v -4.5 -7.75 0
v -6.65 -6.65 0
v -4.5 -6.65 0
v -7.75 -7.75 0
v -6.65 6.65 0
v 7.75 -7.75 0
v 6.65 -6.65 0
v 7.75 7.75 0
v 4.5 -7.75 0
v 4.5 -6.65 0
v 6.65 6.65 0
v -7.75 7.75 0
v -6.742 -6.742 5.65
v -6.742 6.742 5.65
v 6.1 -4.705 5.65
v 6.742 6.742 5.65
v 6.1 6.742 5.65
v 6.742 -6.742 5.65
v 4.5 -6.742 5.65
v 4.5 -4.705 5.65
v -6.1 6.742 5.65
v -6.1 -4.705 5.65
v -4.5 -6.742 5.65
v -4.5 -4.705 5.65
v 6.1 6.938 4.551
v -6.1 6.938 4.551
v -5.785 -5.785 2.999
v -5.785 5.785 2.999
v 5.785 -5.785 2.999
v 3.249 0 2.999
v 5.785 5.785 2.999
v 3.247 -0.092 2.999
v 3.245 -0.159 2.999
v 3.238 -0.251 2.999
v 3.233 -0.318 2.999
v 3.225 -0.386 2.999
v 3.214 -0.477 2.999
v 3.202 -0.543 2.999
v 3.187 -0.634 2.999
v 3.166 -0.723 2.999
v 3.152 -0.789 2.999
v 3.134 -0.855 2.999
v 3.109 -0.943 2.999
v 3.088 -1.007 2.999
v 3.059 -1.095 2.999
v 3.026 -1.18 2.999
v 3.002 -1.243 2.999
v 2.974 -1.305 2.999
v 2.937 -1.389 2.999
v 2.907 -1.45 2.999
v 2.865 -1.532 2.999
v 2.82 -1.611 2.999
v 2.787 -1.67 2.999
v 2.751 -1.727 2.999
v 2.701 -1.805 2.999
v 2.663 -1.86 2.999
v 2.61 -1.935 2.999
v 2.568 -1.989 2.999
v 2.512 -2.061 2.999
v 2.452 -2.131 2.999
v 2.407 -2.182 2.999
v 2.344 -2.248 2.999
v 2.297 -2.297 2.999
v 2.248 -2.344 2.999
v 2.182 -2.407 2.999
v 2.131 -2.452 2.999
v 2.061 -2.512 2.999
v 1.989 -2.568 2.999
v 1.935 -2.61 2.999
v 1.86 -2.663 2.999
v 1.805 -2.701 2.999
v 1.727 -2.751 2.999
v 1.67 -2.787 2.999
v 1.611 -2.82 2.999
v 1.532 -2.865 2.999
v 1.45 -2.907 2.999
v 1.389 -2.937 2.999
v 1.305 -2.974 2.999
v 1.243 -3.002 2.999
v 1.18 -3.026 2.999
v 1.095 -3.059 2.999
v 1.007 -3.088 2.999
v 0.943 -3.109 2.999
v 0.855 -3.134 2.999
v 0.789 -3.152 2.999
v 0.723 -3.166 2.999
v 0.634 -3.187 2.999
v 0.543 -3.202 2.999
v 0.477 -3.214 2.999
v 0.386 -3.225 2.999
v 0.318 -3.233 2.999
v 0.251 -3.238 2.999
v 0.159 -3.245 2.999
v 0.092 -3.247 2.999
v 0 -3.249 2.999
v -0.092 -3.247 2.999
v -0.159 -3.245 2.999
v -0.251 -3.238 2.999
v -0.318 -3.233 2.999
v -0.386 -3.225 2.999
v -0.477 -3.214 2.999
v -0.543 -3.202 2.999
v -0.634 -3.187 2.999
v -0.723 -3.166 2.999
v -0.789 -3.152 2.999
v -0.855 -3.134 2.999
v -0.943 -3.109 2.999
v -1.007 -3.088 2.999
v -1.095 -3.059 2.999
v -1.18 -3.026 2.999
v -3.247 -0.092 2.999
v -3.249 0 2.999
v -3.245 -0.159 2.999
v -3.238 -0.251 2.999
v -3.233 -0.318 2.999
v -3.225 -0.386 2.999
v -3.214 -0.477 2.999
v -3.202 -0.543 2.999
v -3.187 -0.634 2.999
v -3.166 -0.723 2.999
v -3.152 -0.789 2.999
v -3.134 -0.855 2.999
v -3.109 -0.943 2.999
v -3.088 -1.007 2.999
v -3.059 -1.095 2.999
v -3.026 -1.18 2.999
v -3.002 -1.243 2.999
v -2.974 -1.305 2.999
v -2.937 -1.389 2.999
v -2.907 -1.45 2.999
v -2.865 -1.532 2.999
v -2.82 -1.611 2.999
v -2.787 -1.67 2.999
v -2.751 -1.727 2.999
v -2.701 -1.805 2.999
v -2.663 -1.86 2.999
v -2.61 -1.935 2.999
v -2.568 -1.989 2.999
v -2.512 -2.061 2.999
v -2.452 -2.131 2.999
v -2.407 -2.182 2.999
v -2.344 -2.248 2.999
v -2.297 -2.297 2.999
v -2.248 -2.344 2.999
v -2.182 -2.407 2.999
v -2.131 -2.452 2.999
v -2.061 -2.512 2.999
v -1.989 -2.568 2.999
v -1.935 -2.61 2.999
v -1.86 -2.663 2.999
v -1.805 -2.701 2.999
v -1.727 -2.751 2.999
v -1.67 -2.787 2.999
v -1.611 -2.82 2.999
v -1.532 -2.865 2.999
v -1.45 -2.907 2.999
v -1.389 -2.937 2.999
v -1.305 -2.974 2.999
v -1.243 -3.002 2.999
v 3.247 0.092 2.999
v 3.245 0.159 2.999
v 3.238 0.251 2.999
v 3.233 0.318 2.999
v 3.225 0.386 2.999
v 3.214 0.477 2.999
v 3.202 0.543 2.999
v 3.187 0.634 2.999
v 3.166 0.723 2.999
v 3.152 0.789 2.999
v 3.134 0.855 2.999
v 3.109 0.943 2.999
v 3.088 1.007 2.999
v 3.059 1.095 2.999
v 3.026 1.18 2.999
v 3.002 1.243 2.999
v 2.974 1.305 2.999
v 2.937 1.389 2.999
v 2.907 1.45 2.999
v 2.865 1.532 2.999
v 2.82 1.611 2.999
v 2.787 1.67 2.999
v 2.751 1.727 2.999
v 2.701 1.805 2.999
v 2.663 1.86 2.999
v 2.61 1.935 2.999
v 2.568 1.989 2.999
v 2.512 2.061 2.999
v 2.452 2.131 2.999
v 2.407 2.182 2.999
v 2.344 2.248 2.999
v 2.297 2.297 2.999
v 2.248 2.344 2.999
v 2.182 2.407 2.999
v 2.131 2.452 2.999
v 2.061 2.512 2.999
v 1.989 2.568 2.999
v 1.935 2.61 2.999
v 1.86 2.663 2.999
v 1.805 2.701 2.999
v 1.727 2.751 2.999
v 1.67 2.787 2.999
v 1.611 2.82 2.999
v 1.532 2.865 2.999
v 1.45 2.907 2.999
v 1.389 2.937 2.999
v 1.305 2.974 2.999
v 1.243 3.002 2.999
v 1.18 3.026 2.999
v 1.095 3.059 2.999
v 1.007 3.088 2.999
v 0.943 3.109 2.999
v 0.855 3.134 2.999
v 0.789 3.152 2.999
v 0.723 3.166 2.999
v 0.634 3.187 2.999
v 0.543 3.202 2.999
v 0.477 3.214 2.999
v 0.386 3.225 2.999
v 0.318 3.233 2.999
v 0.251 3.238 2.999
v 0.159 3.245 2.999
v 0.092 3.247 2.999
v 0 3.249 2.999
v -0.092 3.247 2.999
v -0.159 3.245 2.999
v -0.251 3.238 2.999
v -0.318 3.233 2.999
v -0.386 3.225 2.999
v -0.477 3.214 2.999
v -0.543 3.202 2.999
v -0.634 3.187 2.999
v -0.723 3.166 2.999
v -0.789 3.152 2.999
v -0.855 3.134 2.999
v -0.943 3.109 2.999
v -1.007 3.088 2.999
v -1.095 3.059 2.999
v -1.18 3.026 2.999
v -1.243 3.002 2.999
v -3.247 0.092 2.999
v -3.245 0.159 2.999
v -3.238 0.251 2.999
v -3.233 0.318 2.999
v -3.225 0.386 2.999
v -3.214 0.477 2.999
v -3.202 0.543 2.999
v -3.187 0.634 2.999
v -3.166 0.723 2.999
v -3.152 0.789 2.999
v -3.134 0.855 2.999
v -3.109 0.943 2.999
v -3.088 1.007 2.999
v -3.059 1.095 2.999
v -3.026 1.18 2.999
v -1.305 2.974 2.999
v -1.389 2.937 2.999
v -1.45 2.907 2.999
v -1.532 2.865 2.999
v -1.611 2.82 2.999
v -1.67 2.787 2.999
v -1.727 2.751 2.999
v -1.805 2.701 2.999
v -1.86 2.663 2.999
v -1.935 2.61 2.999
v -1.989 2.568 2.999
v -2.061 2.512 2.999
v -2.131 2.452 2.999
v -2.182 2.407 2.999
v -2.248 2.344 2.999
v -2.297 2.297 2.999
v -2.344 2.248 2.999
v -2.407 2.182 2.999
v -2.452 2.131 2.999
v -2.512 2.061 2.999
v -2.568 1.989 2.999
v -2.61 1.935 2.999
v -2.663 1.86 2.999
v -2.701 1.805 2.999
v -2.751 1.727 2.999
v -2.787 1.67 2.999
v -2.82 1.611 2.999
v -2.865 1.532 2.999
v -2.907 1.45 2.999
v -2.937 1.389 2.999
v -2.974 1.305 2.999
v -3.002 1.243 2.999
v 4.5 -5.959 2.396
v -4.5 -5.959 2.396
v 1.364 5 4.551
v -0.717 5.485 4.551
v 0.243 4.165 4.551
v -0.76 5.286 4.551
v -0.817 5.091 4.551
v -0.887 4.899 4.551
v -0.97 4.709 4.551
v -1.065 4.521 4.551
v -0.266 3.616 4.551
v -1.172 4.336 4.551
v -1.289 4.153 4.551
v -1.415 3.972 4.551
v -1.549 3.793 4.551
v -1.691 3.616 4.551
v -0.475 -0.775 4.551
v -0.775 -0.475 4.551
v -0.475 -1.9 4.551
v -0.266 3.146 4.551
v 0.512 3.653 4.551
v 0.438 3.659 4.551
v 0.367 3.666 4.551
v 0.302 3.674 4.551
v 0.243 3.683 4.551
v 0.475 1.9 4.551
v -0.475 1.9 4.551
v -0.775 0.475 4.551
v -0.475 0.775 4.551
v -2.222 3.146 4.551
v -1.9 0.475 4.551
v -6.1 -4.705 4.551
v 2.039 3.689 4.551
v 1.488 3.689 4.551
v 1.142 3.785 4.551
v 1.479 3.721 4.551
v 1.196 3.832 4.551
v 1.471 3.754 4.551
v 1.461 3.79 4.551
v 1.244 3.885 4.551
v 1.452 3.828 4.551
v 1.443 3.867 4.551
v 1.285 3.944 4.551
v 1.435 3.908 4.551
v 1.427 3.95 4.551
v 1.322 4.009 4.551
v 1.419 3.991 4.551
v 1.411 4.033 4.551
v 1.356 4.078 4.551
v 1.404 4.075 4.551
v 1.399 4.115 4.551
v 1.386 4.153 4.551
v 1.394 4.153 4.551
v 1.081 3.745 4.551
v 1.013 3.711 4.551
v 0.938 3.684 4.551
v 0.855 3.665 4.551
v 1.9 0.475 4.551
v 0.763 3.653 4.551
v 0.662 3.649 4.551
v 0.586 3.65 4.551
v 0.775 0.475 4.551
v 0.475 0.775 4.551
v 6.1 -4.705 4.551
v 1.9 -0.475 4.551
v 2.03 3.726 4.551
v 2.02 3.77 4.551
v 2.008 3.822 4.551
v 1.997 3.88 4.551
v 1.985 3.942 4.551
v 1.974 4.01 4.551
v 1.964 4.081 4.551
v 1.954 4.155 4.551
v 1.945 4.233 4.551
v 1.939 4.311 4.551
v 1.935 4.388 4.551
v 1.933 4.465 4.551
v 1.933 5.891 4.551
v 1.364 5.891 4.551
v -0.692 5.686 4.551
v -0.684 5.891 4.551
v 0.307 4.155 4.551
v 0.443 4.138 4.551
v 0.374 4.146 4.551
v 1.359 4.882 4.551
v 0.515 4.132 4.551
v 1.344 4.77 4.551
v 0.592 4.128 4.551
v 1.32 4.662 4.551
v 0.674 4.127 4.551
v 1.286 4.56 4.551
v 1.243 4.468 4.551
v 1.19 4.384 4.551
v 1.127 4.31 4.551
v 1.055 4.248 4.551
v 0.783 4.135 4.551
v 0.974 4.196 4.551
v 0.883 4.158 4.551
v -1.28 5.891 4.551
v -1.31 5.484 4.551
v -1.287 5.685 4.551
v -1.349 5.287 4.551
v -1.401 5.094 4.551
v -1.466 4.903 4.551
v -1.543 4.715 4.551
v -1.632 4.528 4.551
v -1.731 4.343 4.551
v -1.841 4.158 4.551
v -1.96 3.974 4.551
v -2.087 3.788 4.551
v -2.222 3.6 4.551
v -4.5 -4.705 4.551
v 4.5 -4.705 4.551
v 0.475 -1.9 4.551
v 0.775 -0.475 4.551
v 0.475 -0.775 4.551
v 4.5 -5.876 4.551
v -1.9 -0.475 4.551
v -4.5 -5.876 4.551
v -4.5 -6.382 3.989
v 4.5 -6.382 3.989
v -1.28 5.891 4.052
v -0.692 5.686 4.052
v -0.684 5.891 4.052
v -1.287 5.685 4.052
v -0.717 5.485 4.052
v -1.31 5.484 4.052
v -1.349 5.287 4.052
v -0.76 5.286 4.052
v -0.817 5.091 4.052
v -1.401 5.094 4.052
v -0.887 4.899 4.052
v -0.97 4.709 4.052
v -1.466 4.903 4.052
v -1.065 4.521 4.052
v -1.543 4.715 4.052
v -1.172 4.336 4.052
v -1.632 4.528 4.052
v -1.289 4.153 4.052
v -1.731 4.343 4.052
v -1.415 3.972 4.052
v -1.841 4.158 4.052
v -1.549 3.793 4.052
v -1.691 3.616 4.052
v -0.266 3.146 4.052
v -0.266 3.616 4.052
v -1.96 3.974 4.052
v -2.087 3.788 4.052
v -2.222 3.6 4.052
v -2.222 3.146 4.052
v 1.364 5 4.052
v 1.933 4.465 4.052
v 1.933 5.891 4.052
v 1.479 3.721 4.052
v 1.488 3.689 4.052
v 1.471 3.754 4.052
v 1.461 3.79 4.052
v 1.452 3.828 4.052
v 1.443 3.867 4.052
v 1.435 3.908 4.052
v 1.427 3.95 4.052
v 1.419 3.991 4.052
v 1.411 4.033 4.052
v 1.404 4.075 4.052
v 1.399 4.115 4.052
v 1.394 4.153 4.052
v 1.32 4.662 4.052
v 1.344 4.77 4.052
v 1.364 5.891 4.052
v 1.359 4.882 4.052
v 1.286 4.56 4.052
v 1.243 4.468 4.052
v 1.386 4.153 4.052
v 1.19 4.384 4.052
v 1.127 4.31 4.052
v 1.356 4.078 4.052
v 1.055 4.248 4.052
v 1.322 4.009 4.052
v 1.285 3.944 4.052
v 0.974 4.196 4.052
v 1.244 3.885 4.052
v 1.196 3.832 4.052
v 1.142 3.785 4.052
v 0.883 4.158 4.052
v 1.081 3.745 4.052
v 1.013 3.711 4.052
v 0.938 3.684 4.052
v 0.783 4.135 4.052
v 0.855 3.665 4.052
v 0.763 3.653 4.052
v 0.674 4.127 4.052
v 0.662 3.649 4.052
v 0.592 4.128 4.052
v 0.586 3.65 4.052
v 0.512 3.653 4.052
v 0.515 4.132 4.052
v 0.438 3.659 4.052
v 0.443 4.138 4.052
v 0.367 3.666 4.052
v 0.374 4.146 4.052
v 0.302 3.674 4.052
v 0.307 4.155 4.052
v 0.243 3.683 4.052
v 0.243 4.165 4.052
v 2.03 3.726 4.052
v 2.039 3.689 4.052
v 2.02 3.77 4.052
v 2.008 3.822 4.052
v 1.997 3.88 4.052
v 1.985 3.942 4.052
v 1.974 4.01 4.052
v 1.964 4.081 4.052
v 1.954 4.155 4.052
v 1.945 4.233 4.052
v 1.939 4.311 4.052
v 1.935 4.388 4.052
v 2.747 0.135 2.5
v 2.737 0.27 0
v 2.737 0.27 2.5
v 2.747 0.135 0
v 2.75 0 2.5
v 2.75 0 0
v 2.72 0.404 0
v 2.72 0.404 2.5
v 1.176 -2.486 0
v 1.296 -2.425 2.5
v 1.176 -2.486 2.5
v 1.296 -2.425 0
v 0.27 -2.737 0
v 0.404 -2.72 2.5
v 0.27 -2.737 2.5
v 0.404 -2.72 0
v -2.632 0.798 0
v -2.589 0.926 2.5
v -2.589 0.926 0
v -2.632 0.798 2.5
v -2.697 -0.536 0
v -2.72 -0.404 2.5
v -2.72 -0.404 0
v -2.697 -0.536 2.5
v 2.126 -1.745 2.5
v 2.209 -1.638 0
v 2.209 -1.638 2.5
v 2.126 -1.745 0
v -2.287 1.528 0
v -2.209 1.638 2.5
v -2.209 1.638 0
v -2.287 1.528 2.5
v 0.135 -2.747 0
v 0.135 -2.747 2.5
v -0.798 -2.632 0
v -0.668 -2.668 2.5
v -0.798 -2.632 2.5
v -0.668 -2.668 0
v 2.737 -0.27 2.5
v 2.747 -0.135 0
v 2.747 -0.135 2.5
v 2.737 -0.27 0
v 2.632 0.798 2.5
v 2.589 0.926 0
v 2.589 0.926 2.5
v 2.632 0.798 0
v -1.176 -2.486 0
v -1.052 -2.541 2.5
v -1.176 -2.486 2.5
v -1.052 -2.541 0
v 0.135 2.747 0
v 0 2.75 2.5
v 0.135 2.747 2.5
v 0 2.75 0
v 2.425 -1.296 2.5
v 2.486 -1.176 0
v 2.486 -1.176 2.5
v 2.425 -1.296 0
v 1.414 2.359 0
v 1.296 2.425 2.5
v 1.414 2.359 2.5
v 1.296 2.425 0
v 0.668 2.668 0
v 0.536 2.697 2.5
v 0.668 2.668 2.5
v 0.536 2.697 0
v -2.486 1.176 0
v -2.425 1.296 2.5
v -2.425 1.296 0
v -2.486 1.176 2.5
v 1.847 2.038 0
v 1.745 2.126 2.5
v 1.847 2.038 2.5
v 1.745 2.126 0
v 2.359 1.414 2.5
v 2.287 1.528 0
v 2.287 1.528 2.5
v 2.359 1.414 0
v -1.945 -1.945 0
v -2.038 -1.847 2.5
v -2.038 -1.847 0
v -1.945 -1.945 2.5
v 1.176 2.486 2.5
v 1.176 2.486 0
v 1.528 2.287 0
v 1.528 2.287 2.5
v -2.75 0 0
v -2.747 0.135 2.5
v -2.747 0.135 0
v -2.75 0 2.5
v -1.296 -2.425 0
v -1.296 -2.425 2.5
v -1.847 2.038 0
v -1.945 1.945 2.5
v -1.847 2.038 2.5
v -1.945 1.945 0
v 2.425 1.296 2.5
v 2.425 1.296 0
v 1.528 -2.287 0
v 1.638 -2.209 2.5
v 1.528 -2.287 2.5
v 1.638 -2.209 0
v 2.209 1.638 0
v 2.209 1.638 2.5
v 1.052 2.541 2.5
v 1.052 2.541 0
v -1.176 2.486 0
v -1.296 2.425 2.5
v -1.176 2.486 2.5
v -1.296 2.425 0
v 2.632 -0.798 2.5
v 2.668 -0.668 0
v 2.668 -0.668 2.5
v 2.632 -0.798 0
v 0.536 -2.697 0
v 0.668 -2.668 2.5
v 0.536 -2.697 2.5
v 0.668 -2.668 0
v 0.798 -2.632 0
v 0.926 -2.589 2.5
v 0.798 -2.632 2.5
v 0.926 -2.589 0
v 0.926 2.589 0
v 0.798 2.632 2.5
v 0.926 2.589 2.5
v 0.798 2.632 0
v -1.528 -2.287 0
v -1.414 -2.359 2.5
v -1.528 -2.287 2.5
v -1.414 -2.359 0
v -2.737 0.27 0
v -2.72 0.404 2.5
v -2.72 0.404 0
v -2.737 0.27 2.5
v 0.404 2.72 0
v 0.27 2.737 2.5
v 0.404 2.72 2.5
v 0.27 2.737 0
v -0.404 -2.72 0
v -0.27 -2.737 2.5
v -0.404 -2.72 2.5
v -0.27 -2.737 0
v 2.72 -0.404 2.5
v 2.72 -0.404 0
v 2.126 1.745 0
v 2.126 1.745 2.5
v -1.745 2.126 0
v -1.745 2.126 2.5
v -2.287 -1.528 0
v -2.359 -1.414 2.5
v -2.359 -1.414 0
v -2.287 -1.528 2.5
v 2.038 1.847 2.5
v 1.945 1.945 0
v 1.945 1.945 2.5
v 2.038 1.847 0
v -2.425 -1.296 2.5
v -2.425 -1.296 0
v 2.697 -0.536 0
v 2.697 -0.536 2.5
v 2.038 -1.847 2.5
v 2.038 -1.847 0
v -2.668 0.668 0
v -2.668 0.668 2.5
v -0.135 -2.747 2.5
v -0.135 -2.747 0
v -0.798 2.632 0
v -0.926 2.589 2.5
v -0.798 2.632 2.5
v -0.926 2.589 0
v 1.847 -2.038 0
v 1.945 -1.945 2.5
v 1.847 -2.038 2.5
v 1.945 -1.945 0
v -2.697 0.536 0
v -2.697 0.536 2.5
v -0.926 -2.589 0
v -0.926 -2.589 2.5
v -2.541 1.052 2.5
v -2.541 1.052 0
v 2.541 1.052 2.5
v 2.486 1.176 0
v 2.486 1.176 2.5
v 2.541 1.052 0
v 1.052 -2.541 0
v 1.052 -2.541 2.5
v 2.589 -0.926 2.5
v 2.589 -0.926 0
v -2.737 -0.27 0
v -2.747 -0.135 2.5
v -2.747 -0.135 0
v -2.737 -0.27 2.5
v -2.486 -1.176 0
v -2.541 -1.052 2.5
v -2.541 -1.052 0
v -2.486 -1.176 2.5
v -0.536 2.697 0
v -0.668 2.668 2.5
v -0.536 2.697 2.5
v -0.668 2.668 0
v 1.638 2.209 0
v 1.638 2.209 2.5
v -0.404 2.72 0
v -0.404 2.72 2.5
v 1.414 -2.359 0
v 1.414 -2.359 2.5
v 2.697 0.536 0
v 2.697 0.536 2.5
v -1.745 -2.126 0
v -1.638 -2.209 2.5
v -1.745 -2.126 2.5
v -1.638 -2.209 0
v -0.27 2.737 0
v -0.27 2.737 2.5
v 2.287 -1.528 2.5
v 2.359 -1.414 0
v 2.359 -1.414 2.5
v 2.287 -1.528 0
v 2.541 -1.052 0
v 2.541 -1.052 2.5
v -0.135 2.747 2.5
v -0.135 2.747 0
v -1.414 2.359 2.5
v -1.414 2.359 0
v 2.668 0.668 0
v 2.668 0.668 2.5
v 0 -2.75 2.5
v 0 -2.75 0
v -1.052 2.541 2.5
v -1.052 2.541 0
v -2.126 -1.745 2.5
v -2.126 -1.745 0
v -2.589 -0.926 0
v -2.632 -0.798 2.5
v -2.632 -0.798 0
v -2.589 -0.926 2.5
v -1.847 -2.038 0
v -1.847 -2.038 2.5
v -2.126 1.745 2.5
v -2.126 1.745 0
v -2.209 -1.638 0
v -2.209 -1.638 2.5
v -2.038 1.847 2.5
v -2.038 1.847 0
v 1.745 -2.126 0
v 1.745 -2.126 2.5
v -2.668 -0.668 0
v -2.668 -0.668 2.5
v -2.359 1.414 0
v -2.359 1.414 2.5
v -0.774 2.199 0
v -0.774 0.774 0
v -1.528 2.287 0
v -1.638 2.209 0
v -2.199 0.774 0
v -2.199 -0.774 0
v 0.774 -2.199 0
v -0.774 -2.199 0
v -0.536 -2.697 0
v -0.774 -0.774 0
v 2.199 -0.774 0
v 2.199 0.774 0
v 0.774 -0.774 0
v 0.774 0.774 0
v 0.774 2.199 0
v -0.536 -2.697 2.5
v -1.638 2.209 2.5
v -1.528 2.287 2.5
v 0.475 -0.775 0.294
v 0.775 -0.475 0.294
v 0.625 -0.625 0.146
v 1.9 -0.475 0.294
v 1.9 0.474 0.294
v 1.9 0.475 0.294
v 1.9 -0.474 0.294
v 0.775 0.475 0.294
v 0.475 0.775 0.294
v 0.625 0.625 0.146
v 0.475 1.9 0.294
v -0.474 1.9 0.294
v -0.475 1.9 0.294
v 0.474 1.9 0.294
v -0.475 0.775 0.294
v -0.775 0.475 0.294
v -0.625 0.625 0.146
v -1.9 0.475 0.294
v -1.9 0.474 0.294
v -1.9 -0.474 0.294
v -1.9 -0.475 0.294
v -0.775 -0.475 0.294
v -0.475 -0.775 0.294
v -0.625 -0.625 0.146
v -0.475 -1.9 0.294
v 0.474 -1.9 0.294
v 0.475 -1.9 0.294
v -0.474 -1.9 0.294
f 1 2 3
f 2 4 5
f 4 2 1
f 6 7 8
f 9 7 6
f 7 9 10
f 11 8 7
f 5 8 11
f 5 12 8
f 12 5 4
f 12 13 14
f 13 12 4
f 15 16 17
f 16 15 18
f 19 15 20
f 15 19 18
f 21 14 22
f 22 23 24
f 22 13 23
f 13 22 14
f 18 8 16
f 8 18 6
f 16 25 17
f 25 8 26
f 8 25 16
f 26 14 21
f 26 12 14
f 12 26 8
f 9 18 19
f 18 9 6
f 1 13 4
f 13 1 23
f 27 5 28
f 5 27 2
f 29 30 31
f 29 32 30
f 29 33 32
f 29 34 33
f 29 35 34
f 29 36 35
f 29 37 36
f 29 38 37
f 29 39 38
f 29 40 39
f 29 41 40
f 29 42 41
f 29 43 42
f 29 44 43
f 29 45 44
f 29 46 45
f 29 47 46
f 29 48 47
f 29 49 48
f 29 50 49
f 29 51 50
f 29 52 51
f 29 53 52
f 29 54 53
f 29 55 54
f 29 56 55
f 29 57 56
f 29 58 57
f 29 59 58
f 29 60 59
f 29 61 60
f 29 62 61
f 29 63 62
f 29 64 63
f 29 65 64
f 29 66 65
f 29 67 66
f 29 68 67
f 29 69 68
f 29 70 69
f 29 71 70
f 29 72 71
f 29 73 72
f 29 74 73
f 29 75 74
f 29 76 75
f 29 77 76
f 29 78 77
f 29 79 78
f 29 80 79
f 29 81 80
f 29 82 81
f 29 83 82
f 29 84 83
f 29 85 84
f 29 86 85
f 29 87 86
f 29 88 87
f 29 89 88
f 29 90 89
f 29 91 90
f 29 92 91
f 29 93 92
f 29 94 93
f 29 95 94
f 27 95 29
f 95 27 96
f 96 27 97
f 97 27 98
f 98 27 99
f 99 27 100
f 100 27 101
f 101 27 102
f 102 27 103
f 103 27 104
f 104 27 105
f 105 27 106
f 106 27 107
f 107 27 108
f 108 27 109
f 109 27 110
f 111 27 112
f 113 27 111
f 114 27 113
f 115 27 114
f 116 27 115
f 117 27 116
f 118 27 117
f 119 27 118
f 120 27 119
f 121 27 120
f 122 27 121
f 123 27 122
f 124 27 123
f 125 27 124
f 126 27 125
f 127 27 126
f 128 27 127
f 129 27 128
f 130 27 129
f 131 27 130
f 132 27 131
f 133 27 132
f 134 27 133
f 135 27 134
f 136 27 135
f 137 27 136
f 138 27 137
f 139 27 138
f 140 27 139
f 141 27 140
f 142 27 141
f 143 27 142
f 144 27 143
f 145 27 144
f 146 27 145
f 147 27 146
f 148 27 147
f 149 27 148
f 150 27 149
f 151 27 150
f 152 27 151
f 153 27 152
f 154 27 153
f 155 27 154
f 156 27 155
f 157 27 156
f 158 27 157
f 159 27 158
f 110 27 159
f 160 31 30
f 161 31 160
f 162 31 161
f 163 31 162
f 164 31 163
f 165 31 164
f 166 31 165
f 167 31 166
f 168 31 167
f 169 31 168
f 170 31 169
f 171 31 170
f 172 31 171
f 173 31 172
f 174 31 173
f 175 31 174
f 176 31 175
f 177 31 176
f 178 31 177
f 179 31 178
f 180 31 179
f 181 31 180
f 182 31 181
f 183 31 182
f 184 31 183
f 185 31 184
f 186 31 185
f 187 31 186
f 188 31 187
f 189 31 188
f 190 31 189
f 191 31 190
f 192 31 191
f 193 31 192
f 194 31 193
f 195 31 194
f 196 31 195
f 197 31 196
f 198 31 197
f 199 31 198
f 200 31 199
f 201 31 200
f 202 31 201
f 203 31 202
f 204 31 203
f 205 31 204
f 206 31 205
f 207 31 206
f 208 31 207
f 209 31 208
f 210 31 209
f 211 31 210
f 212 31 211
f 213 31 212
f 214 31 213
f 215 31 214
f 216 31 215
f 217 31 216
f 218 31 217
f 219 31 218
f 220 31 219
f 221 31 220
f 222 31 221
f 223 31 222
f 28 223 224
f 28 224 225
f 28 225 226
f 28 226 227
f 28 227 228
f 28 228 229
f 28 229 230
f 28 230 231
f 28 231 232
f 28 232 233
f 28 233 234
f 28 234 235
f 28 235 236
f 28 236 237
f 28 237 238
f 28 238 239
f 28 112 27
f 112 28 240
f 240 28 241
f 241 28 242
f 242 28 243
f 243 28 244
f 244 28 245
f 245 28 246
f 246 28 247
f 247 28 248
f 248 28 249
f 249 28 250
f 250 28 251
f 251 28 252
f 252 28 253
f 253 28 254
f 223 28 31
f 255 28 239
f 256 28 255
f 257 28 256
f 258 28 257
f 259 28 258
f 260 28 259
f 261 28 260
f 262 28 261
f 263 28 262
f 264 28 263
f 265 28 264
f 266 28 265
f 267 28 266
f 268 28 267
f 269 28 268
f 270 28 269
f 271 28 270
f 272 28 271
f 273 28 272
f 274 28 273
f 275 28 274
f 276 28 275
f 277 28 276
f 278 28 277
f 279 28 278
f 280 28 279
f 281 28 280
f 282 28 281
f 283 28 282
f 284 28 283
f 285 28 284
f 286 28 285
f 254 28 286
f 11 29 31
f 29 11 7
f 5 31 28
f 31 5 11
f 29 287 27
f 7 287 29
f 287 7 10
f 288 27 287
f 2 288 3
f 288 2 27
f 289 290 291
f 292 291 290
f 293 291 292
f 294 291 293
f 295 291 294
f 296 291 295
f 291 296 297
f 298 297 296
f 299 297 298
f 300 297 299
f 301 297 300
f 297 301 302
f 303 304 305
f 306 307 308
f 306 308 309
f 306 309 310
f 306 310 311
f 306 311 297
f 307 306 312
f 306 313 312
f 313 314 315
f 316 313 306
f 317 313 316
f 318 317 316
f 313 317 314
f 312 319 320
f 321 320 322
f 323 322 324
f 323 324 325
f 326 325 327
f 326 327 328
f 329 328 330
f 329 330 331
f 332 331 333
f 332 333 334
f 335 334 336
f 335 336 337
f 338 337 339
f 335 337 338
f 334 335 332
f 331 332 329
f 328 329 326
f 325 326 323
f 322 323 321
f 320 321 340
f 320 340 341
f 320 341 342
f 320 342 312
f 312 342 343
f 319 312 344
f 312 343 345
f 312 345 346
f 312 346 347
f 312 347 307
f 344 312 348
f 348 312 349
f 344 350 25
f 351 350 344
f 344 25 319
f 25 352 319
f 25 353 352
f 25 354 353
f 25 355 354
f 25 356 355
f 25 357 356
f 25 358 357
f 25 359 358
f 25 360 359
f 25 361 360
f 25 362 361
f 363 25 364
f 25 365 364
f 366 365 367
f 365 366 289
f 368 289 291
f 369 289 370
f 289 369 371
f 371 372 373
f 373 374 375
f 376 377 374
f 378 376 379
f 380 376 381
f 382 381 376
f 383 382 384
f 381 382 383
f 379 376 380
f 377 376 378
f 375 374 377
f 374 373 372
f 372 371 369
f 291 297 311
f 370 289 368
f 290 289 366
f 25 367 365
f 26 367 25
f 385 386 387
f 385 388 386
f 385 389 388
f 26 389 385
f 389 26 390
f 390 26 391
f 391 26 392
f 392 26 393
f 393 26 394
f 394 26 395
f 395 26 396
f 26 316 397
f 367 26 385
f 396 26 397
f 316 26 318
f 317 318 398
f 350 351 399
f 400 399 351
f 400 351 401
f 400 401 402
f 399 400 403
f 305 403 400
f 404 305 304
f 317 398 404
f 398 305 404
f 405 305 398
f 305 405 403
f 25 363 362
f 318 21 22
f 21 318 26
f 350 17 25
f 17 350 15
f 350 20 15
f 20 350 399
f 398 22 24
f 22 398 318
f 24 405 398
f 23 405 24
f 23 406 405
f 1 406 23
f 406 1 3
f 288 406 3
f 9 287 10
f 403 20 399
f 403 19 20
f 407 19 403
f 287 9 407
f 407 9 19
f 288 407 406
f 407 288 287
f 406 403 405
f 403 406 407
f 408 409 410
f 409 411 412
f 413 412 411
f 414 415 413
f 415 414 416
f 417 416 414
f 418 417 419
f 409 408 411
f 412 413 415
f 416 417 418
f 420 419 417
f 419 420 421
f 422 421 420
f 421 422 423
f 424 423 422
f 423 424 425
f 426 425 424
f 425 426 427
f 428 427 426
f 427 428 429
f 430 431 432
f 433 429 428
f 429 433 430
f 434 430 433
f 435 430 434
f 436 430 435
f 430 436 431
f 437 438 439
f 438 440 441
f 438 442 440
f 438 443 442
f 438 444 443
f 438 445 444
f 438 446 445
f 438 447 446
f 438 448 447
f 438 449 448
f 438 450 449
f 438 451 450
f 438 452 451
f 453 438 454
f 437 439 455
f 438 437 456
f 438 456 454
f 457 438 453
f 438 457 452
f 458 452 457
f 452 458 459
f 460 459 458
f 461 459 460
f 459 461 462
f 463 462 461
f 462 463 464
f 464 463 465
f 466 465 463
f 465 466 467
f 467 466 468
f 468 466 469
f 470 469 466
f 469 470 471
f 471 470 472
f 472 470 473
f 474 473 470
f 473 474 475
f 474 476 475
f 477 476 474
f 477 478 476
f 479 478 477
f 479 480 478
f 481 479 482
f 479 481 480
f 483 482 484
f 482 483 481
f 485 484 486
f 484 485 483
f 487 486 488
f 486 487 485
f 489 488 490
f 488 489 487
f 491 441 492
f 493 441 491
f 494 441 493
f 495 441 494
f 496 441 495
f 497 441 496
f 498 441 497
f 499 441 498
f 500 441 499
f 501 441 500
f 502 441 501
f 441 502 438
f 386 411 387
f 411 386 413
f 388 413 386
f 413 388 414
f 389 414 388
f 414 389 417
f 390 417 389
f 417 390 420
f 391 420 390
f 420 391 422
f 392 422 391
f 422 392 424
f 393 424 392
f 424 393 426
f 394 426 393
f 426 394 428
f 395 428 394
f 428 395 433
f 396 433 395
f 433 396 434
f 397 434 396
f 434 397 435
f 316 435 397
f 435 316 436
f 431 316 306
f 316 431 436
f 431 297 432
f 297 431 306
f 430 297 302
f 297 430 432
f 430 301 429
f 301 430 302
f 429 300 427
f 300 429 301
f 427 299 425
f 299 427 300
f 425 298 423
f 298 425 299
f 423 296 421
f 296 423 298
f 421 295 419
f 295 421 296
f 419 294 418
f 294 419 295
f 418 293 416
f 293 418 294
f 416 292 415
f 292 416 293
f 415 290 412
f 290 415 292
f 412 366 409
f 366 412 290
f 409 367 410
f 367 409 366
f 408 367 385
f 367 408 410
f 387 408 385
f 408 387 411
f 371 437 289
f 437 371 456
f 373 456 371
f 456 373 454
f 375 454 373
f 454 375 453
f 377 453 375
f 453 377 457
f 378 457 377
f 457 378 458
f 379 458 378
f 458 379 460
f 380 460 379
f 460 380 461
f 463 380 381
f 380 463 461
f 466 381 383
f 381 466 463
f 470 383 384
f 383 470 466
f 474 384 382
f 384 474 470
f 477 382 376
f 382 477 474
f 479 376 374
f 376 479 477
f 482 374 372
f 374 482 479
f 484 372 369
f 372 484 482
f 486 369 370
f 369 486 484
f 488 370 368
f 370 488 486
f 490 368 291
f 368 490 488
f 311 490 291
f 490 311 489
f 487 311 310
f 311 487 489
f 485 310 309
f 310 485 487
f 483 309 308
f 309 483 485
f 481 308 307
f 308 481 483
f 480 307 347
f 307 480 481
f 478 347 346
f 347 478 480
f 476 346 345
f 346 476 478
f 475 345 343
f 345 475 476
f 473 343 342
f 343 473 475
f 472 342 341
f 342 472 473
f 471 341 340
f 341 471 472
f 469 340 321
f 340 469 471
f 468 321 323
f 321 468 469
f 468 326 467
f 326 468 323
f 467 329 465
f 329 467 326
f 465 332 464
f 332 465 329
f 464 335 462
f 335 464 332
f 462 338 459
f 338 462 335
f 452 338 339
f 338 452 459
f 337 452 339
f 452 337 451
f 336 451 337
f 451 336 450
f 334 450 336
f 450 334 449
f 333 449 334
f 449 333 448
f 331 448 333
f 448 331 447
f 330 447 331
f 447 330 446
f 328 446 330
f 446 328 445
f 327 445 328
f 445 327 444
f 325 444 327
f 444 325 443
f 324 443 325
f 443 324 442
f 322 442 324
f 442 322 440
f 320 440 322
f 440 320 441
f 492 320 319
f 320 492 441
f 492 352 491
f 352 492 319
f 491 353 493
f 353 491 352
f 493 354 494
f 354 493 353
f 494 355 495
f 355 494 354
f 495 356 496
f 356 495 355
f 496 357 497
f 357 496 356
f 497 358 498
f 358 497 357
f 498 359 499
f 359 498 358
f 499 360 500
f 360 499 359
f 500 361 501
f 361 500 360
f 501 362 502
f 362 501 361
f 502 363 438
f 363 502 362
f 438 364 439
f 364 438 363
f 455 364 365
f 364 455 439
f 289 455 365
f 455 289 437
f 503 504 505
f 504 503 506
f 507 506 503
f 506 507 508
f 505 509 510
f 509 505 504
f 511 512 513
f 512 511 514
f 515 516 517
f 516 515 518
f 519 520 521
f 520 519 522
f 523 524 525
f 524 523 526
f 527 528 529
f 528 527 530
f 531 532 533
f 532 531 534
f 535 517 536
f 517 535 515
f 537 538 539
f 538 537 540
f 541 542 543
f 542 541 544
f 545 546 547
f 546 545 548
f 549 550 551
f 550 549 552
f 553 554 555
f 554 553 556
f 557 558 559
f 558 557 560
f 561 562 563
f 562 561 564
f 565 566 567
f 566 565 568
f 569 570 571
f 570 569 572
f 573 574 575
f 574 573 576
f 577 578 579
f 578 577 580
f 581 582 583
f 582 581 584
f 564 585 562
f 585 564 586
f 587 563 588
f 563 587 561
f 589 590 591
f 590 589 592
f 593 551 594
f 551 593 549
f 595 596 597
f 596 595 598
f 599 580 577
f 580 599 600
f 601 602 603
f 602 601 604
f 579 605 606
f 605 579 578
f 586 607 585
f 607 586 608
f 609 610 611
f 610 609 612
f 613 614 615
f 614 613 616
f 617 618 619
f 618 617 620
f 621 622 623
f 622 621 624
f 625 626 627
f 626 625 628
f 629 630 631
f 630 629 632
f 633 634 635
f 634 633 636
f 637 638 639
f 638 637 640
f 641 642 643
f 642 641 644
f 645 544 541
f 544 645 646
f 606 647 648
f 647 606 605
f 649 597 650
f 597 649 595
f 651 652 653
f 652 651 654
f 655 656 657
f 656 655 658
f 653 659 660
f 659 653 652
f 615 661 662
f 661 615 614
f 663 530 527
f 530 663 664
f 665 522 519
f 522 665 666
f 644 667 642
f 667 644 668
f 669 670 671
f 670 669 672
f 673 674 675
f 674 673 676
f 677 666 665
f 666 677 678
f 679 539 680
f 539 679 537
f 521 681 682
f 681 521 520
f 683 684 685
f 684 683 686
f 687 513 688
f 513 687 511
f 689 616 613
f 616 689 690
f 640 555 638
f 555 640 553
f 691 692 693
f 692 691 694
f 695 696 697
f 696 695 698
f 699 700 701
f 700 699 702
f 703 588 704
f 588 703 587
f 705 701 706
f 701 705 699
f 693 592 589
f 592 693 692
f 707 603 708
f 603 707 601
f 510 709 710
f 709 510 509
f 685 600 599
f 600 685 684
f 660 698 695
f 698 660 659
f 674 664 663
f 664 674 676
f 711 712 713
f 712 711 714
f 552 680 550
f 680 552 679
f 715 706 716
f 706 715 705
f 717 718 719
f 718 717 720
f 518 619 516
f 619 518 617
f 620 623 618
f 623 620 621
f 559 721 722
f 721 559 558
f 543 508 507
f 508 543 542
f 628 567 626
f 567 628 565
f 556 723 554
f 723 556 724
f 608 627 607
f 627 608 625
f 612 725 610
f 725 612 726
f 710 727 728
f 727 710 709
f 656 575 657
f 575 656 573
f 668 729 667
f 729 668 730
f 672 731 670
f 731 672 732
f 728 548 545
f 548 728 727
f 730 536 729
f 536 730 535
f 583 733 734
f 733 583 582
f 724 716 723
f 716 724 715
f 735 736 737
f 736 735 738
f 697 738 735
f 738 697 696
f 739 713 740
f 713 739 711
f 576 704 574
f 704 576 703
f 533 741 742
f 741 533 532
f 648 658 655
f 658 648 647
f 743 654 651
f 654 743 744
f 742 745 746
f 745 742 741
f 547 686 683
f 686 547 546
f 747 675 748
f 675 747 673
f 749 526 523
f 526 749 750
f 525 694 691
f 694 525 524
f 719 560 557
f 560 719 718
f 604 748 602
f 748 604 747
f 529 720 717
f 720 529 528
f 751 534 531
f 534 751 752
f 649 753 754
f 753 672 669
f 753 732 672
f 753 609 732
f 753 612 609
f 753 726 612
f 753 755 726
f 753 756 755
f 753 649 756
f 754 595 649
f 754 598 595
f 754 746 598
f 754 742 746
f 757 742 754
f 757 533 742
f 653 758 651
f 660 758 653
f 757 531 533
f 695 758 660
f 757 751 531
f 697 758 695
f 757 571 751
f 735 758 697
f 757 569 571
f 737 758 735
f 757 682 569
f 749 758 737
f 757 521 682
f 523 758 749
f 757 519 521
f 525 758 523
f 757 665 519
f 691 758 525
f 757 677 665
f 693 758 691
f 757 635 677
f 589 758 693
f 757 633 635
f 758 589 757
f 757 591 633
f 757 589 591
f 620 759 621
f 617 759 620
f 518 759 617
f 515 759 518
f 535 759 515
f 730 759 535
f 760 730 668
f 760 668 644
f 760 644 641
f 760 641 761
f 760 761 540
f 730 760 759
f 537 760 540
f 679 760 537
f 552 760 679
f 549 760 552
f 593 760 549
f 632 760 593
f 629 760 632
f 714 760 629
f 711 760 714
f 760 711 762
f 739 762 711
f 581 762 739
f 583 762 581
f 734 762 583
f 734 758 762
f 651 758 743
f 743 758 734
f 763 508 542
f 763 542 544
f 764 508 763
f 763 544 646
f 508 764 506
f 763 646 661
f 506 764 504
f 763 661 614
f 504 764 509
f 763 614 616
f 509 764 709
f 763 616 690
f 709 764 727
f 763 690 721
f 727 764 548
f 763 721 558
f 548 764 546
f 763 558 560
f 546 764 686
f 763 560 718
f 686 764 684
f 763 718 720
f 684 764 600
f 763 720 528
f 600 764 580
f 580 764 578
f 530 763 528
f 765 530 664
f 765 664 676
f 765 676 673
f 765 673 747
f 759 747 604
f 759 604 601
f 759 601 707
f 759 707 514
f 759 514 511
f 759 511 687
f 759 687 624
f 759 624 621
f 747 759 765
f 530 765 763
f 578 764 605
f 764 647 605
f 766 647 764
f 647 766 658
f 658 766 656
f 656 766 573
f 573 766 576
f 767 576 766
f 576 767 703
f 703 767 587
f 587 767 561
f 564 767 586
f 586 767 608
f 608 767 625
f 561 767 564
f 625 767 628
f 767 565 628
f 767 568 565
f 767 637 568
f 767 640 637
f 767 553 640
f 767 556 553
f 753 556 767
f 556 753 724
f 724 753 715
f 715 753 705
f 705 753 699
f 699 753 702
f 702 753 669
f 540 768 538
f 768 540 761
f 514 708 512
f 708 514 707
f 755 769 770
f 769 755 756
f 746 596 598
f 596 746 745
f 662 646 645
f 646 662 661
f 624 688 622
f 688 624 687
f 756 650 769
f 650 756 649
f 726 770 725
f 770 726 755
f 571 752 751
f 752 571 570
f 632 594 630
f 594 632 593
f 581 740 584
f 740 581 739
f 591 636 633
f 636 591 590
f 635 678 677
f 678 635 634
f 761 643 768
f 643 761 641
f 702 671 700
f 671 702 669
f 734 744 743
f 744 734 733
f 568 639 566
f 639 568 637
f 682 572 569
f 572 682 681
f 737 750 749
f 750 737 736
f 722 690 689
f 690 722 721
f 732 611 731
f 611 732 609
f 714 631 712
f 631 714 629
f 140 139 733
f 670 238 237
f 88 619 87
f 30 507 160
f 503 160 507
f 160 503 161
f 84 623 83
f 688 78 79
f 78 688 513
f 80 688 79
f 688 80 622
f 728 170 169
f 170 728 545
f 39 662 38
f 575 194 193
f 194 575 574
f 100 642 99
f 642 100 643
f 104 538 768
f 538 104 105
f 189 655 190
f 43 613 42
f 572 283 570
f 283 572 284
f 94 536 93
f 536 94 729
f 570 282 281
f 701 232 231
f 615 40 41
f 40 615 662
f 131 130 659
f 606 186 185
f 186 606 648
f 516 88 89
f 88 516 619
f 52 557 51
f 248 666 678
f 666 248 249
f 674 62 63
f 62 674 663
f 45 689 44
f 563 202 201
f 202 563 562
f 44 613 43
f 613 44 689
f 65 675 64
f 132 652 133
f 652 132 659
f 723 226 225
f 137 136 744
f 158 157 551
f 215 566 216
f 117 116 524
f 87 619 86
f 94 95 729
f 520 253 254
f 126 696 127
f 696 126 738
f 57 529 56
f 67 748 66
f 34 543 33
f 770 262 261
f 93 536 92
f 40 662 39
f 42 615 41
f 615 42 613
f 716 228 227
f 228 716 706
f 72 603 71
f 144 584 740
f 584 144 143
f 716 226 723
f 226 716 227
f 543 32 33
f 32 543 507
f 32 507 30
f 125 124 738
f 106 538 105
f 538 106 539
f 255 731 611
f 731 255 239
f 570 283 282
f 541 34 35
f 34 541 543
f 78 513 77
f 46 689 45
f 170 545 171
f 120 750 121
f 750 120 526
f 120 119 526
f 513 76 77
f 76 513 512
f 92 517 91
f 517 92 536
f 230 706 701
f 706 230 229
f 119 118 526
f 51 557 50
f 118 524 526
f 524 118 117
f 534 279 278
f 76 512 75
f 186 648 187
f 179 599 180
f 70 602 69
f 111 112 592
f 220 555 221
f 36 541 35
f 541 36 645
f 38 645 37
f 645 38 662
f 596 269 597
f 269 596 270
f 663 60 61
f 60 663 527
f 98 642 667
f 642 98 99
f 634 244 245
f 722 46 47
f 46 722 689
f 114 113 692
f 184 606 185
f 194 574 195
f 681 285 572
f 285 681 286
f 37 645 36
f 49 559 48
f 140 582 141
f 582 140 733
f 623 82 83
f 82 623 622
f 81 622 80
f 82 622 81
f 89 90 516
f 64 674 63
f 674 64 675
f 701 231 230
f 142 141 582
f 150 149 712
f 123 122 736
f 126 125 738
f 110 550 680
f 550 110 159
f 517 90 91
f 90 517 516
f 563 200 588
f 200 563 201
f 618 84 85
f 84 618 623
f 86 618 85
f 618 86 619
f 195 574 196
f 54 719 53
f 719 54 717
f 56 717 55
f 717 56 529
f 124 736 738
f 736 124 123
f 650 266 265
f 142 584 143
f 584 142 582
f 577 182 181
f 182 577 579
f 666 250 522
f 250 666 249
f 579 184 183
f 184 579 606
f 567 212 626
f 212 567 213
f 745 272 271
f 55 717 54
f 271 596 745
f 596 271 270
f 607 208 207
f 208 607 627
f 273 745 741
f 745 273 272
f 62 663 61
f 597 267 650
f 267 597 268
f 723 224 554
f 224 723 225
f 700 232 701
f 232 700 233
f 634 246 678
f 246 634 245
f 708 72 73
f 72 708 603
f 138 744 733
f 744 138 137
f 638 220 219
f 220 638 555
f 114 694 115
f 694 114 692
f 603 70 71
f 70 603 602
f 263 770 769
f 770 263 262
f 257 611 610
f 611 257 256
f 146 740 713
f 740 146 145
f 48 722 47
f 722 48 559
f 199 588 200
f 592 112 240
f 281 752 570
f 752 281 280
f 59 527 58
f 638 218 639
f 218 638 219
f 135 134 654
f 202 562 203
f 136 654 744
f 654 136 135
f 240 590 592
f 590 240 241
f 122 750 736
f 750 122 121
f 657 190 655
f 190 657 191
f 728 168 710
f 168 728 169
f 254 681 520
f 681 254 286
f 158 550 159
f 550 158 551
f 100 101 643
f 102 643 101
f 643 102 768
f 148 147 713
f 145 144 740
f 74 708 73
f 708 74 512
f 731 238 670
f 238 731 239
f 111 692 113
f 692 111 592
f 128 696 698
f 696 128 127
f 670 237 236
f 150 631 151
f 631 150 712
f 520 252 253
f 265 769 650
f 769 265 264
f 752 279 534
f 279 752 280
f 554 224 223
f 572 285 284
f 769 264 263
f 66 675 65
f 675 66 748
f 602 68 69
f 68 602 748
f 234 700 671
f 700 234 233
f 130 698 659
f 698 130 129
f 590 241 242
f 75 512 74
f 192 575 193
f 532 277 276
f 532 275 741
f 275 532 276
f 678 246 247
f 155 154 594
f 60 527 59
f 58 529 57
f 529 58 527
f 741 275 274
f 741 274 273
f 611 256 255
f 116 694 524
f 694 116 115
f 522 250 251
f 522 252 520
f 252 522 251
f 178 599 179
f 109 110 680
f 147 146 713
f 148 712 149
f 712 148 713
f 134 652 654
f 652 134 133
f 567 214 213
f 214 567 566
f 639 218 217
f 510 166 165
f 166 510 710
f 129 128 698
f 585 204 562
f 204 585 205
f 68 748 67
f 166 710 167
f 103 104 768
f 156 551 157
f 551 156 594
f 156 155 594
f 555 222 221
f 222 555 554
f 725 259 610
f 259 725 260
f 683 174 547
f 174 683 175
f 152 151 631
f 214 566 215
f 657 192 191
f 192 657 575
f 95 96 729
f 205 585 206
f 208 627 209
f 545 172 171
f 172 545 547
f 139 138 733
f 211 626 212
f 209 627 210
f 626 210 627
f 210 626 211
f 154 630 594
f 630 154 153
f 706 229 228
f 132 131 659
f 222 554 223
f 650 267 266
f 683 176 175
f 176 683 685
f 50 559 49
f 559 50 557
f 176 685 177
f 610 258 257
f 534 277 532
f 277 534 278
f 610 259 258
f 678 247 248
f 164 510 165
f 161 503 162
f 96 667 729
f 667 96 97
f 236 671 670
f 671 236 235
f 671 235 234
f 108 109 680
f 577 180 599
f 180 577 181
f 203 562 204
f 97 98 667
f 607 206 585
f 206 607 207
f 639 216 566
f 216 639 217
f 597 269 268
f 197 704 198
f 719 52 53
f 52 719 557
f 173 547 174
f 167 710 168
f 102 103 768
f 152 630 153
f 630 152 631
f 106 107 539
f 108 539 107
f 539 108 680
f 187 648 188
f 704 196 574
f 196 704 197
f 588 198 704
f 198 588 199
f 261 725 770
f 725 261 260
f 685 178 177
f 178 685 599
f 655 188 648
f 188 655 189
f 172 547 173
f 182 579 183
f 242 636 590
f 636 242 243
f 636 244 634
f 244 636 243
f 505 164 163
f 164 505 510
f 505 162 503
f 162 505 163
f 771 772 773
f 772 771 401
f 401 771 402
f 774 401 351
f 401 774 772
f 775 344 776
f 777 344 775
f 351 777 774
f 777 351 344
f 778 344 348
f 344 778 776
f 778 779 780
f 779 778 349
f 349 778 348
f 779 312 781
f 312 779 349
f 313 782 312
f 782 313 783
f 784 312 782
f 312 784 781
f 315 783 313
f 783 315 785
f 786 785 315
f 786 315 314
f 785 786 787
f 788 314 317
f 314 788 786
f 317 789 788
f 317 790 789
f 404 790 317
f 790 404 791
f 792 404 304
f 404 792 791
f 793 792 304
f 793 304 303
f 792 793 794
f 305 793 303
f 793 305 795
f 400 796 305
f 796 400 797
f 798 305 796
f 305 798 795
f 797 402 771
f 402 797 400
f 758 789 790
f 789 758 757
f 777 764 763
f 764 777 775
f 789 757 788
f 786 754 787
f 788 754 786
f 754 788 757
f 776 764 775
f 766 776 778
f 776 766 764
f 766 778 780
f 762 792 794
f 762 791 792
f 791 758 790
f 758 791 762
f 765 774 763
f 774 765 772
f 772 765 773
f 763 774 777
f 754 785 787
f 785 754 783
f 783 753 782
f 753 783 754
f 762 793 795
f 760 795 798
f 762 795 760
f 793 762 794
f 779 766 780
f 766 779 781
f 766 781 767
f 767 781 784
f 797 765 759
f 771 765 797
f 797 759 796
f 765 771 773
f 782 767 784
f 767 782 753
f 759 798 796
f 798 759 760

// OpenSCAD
revision = "r7";
text_font = "Liberation Mono:style=Bold";
text_size = 3;
text_height = 0.5;

surface_offset = 0.001;
stem_x = 15.5;
stem_y = 15.5;
stem_height = 5.65;
stem_top_bottom_ratio = 0.87;

inside_x = 13.3;
inside_y = 13.3;
inside_hight = 3;

mx_cylinder = 5.5;
mx_cross = 4.1;
mx_cross_width = 1.25;
mx_cross_fillet = 0.3;

disp_x = 12.2;
disp_y = 12.1;
disp_height = 1.1;
disp_y_center_offset = 1.345;
cable_stem_x = 9.0;
cable_stem_y = 2.12;
cable_thickness = 0.5;

difference() {
    union() {
        difference() {
            //hollow keycap
            linear_extrude(height = stem_height, scale = stem_top_bottom_ratio)
                square([stem_x, stem_y], center = true);
            translate([0,0,-surface_offset])
                linear_extrude(height = inside_hight, scale = stem_top_bottom_ratio)
                    square([inside_x, inside_y], center = true);
            
            //display cut-out
            translate([0,disp_y_center_offset,stem_height-disp_height+surface_offset])
                linear_extrude(height = disp_height, scale = 1)
                    square([disp_x, disp_y], center = true);
            translate([0,disp_y_center_offset-disp_y/2-cable_stem_y/2+surface_offset,stem_height-disp_height+surface_offset])
                linear_extrude(height = disp_height, scale = 1)
                    square([cable_stem_x, cable_stem_y], center = true);
            
            //FFC cutout
            translate([0,disp_y_center_offset-disp_y/2-cable_stem_y-cable_thickness/2+surface_offset*2,stem_height+surface_offset]) rotate([0,180,0])
                linear_extrude(height = stem_height+surface_offset*2, scale = [1,7])
                    square([cable_stem_x, cable_thickness], center = true);
            translate([0,disp_y_center_offset-disp_y/2-cable_stem_y-0.05,stem_height-disp_height+surface_offset*2-1])
                linear_extrude(height = 1, scale = [1,10])
                    square([cable_stem_x, 0.2], center = true);
            //side insertion slit
            /*translate([8.4,-4.0,-surface_offset])
                rotate([0,0,25]) linear_extrude(height = stem_height+surface_offset*2, scale = 1)
                    square([cable_stem_x, 0.5], center = true);*/
            
            
            //revision text
            translate([0,disp_y/2-text_size/2,stem_height-disp_height-text_height+surface_offset*2])
                rotate([0,0,180]) linear_extrude(height = text_height) {
                    text(revision, size = text_size, font = text_font, halign = "center", valign = "center", $fn = 16);
                }
        }
        //stem
        union() {
            cylinder(r=mx_cylinder/2,h=stem_height-disp_height, $fn = 128,center=false);
            translate([0,0,2.5]) cylinder(r1=mx_cylinder/2, r2=mx_cylinder/2+1,h=1, $fn = 128,center=false);
        }
    }
    //cut out cross
    translate([0,0,-surface_offset])
        linear_extrude(height = stem_height, scale = 1)
            offset(r = -mx_cross_fillet) {
                union() {
                    square([mx_cross+mx_cross_fillet, mx_cross_width+mx_cross_fillet], center = true);
                    square([mx_cross_width+mx_cross_fillet, mx_cross+mx_cross_fillet], center = true);
                }
            }
    //camfer at bottom
    translate([0,0,-surface_offset])
        linear_extrude(height = mx_cross_fillet, scale = [mx_cross/(mx_cross+2*mx_cross_fillet)-0.011, mx_cross_width/(mx_cross_width+2*mx_cross_fillet)-0.07])
            square([mx_cross+mx_cross_fillet, mx_cross_width+mx_cross_fillet], center = true);
            translate([0,0,-surface_offset])
    linear_extrude(height = mx_cross_fillet, scale = [mx_cross_width/(mx_cross_width+2*mx_cross_fillet)-0.07,mx_cross/(mx_cross+2*mx_cross_fillet)-0.011])
            square([mx_cross_width+mx_cross_fillet,mx_cross+mx_cross_fillet], center = true);
}
